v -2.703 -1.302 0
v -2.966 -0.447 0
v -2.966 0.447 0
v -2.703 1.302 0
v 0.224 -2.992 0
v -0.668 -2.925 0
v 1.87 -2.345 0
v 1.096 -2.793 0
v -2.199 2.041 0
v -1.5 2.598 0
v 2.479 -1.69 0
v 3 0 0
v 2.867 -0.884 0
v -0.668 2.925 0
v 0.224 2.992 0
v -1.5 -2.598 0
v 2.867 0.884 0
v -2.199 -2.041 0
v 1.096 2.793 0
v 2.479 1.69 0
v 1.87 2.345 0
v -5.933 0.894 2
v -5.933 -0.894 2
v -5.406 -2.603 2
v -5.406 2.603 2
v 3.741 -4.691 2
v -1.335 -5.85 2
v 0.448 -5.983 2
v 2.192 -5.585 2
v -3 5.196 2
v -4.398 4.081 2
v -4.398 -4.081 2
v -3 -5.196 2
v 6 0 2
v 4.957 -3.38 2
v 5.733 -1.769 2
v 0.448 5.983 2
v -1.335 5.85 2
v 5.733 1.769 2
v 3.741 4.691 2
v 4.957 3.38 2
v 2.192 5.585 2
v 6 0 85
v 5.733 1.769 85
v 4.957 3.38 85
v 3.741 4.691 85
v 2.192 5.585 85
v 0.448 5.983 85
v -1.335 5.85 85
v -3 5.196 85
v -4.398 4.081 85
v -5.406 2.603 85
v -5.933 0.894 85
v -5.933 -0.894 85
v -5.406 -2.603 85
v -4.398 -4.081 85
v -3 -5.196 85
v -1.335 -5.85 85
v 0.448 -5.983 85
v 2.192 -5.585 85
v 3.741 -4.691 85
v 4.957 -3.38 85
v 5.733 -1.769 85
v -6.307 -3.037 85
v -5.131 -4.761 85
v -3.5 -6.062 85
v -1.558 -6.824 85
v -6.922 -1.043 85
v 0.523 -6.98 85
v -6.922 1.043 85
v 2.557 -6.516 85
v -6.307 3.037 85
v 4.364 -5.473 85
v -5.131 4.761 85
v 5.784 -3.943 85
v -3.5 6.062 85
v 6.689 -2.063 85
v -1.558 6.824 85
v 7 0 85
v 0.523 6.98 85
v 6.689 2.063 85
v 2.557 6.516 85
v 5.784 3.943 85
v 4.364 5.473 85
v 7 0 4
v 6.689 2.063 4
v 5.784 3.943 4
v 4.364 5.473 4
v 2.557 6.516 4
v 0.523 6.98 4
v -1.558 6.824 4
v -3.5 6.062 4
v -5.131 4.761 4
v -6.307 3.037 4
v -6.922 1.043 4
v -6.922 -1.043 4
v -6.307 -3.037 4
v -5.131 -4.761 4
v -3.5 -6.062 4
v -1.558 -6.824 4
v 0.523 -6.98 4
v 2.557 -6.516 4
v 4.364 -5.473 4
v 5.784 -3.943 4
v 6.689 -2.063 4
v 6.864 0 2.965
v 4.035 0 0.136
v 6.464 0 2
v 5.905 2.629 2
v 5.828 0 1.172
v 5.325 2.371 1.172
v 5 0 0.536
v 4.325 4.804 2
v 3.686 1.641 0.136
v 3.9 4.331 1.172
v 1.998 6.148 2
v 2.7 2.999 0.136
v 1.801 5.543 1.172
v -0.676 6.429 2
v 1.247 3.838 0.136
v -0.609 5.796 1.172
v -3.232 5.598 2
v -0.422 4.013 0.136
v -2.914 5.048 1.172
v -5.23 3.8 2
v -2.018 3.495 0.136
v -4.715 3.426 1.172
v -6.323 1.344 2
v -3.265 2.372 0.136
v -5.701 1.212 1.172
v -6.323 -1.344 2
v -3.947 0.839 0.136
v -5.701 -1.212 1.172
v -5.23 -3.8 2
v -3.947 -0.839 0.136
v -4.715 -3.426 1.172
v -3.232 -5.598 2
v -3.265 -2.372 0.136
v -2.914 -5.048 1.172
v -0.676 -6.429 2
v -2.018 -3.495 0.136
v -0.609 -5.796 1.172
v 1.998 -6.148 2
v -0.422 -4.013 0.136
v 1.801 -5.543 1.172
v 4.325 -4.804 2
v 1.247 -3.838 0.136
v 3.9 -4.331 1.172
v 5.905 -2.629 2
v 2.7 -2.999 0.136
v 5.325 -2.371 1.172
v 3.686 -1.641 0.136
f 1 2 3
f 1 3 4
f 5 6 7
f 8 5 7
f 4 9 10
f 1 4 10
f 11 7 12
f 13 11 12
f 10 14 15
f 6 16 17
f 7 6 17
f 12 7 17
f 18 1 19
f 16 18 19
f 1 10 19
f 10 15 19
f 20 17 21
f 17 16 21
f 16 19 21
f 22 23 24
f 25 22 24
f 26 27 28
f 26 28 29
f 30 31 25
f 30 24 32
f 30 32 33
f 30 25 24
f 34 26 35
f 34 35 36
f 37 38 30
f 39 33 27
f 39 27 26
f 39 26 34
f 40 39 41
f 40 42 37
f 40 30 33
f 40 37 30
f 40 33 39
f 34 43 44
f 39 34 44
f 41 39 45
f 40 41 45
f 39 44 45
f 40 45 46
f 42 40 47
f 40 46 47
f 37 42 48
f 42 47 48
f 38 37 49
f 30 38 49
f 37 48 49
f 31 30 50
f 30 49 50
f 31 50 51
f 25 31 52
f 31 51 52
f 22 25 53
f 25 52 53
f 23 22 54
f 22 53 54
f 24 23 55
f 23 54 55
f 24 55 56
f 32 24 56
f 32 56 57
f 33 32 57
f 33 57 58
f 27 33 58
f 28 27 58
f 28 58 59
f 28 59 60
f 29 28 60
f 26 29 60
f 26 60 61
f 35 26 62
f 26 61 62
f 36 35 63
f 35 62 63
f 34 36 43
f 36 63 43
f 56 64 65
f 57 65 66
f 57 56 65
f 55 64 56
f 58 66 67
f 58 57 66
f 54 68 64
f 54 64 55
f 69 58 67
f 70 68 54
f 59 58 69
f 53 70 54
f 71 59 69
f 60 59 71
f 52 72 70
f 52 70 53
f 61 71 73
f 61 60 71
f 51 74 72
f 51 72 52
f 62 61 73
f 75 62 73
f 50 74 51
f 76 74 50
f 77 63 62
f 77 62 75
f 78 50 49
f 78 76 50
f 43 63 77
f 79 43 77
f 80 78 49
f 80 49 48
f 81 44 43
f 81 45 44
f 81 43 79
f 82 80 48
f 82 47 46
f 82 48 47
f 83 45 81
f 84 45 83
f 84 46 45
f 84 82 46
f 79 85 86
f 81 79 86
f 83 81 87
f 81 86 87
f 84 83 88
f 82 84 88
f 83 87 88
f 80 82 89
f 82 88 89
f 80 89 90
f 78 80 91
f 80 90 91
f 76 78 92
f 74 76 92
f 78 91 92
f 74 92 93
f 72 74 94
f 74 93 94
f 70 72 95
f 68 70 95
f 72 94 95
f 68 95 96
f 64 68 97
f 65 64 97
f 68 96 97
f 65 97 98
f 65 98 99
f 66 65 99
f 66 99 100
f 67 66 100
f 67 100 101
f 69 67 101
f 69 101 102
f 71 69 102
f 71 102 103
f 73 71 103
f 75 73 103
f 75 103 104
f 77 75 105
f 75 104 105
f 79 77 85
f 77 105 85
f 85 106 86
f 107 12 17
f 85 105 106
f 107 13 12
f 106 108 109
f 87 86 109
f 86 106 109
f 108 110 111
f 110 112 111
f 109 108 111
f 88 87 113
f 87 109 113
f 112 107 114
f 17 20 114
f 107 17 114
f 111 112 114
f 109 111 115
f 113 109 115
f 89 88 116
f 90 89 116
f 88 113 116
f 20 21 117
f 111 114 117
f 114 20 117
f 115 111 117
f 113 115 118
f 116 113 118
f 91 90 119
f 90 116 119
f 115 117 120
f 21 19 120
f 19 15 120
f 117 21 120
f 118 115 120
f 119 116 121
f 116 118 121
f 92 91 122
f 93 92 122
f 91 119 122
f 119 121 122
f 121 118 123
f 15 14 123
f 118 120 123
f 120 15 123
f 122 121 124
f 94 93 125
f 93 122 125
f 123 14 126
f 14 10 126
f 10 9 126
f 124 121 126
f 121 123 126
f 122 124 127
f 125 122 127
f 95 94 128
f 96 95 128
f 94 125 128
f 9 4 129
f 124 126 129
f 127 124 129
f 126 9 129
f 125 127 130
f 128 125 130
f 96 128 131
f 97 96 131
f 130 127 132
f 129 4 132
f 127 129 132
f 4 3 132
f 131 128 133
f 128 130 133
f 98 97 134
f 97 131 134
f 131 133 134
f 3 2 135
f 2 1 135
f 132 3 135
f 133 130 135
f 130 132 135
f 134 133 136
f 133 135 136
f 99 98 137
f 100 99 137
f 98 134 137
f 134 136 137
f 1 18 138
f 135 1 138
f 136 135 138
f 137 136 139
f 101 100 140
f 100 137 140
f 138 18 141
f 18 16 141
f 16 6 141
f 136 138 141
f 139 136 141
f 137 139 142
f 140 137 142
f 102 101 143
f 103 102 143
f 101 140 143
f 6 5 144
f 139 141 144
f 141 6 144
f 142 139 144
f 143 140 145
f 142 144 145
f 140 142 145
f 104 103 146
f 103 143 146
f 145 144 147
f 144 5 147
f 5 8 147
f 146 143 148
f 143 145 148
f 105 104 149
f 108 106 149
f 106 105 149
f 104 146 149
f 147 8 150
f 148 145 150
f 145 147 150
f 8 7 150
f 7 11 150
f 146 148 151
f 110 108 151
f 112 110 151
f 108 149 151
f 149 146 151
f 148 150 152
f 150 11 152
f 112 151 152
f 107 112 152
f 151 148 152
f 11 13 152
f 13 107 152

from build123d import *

# Parameters (mm, degrees)
SKETCH_R     = 7
PAD_DEPTH    = 85
SKETCH001_R  = 6
POCKET_DEPTH = 83
FILLET_R     = 4


with BuildPart() as part:
    # Sketch → Pad (new body)
    with BuildSketch(Plane.XY):
        Circle(SKETCH_R)
    extrude(amount=PAD_DEPTH)

    # Sketch001 (on Face3 of Pad) → Pocket (cut)
    with BuildSketch(Plane.XY.offset(85)):
        Circle(SKETCH001_R)
    extrude(amount=-POCKET_DEPTH, mode=Mode.SUBTRACT)

    # Fillet
    fillet_edges = [part.edges().sort_by_distance(p)[0] for p in [
        (-7, 0, 0),
    ]]
    fillet(fillet_edges, radius=FILLET_R)


solid = part.part
